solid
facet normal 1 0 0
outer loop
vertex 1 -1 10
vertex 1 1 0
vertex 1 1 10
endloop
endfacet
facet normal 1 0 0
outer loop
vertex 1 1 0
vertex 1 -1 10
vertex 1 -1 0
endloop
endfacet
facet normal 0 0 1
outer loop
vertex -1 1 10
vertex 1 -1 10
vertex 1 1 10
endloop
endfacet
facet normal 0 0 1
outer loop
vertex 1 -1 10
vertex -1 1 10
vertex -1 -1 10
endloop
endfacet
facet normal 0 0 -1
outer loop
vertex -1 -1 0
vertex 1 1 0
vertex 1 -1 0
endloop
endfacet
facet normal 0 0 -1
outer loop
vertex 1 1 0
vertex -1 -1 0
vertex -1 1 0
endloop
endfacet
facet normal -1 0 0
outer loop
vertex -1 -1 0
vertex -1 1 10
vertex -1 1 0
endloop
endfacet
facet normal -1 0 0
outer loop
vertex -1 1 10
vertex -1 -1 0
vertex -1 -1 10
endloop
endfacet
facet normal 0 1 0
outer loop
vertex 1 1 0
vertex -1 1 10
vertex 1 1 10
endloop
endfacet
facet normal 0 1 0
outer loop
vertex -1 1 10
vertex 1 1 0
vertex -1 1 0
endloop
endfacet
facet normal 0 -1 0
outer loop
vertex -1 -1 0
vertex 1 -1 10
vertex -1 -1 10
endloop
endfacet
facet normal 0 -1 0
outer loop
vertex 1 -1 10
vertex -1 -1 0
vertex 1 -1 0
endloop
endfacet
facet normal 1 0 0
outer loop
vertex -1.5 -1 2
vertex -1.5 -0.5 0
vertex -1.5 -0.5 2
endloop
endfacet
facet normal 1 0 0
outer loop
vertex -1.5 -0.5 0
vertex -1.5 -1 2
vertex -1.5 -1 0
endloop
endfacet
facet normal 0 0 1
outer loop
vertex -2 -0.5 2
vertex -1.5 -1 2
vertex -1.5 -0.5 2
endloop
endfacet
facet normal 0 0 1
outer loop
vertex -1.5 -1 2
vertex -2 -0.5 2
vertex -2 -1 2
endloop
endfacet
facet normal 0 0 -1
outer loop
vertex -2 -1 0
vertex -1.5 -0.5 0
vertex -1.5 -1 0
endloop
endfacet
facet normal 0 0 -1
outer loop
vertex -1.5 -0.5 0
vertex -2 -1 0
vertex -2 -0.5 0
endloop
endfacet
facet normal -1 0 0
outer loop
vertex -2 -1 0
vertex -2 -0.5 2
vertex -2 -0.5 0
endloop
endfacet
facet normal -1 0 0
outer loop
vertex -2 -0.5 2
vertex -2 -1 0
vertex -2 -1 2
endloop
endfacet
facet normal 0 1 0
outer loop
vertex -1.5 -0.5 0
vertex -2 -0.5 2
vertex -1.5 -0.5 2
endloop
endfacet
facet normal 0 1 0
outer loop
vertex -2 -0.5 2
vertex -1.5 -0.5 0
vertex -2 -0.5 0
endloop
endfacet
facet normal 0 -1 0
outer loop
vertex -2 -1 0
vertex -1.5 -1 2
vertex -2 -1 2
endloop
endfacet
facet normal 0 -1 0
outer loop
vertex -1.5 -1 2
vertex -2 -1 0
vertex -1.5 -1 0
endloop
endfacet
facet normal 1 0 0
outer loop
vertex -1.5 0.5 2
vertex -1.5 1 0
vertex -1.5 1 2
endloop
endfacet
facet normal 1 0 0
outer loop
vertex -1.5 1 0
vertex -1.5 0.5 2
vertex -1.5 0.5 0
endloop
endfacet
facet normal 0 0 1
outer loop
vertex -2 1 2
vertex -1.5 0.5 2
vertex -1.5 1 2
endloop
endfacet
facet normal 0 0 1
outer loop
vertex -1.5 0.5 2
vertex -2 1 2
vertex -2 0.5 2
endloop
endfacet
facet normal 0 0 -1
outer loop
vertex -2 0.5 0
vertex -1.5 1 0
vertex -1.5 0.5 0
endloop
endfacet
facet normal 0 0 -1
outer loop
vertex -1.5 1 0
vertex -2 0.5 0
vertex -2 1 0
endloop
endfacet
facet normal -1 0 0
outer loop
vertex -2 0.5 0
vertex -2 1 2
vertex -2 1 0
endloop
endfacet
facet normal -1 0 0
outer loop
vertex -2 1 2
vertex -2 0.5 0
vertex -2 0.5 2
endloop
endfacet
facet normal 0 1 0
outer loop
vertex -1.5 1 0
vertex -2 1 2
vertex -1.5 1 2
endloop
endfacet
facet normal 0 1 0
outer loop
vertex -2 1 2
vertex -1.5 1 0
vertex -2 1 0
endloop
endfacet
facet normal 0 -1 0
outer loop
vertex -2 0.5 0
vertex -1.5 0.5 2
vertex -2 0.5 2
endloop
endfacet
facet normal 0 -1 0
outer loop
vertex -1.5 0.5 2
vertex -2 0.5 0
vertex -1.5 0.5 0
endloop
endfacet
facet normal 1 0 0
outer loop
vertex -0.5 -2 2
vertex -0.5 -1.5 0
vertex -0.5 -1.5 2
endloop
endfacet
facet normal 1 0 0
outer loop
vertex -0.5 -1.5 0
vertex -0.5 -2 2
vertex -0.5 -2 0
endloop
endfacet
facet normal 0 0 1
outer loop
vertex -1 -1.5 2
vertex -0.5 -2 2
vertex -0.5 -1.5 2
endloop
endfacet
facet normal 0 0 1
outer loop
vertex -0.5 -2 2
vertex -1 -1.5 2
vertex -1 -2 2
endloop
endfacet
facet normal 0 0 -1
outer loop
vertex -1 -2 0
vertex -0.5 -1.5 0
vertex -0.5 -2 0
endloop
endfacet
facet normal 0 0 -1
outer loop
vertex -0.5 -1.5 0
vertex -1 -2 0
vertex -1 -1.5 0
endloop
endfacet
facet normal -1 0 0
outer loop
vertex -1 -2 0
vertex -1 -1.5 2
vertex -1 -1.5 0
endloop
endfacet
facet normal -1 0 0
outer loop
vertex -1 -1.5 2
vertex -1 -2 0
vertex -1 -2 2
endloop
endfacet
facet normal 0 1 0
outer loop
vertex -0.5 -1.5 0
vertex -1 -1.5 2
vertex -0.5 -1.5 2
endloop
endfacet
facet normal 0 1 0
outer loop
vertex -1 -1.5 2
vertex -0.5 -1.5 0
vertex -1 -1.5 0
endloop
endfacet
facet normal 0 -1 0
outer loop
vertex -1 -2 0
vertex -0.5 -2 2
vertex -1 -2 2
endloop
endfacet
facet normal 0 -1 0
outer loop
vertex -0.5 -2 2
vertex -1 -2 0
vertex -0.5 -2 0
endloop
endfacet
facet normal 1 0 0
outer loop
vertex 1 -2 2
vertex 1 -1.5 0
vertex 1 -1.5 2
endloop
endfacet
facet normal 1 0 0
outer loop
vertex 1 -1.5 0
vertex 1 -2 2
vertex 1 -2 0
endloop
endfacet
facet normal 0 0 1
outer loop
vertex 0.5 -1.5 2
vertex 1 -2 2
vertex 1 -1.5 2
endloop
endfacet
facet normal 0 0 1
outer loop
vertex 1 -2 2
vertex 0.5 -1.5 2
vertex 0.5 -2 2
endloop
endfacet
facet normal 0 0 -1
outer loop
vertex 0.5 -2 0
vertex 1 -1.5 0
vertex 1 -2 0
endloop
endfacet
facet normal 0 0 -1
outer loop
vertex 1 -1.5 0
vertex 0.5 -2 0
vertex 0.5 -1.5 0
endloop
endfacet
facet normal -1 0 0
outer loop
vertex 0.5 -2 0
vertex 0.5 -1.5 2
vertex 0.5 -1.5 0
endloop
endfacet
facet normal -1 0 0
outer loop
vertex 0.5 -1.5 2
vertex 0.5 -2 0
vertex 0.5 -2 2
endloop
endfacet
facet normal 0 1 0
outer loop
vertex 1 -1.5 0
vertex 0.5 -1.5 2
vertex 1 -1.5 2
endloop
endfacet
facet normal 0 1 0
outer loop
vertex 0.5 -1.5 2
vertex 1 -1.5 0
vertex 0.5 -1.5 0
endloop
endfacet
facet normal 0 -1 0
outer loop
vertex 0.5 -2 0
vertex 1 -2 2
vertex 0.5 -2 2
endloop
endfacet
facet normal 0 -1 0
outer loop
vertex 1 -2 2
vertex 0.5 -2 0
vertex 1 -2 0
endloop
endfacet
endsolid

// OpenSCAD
translate([0, 0, 5]) color([0,1,0,0.9]) cube([2, 2, 10], center=true);
translate([-1.75, -0.75, 1]) color([1,0,0]) cube([0.5, 0.5, 2], center=true);
translate([-1.75, 0.75, 1]) color([1,0,0]) cube([0.5, 0.5, 2], center=true);
translate([-0.75, -1.75, 1]) color([1,0,0]) cube([0.5, 0.5, 2], center=true);
translate([0.75, -1.75, 1]) color([1,0,0]) cube([0.5, 0.5, 2], center=true);
